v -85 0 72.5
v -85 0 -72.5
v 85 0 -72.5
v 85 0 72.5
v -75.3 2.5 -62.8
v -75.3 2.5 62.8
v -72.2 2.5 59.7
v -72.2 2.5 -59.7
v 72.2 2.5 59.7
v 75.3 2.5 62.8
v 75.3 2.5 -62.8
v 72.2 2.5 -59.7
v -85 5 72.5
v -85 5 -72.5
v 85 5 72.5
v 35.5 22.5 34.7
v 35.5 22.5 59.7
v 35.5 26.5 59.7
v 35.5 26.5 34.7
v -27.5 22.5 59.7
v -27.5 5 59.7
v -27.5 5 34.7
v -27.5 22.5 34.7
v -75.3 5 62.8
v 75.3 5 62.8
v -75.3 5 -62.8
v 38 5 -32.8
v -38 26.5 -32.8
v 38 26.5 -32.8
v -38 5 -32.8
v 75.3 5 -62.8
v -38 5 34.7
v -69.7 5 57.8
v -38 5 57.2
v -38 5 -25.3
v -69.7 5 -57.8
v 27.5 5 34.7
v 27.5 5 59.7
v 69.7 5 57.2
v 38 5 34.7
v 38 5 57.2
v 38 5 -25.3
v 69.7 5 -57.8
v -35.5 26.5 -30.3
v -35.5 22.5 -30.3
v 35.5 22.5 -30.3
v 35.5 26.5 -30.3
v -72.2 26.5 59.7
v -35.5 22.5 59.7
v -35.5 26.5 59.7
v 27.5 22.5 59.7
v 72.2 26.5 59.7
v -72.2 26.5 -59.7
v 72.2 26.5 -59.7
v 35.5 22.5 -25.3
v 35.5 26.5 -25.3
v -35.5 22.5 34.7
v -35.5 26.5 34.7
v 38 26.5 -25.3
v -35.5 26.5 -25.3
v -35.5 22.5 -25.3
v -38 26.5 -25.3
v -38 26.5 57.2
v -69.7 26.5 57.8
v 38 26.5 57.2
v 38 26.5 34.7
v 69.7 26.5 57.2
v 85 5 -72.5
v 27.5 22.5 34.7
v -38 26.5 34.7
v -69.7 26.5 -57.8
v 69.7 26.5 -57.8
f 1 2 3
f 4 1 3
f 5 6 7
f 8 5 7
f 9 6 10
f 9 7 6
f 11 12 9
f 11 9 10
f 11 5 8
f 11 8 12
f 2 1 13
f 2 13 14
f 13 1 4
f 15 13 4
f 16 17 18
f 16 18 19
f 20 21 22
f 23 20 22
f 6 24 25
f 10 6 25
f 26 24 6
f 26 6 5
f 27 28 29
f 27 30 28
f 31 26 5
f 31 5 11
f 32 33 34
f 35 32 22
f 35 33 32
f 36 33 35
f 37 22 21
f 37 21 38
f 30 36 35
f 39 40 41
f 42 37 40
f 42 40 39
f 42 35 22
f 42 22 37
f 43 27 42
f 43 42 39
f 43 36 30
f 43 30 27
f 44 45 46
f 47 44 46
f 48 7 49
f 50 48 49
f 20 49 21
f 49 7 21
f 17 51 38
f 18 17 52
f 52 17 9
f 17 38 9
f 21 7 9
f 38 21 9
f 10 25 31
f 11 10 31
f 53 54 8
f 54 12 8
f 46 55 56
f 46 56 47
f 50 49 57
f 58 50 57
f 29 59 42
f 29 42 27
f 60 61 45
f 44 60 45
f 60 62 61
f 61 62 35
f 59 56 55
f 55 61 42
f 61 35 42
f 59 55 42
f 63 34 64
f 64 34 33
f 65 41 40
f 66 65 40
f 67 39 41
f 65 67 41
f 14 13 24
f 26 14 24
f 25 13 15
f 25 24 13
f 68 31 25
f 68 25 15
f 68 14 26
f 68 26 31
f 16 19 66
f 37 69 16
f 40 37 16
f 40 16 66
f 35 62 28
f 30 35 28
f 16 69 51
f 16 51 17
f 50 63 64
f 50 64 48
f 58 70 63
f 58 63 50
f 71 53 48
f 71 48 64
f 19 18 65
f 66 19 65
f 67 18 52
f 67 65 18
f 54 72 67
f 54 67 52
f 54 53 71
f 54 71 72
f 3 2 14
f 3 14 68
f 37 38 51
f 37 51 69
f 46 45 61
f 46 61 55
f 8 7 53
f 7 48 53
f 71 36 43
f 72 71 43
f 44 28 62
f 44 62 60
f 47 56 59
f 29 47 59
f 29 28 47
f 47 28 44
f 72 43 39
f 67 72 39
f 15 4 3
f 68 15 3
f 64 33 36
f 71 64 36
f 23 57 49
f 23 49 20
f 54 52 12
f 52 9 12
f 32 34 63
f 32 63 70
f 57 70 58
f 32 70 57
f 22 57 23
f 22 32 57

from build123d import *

# Parameters (mm, degrees)
SKETCH1_W           = 170
SKETCH1_H           = 145
BOSS_EXTRUDE1_DEPTH = 5
SKETCH2_W           = 150.6
SKETCH2_H           = 125.6
SKETCH2_W_2         = 144.4
SKETCH2_H_2         = 119.4
CUT_EXTRUDE1_DEPTH  = 2.5
SKETCH5_W           = 71
SKETCH5_H           = 7.5
SKETCH5_W_2         = 8
SKETCH5_H_2         = 25
BOSS_EXTRUDE2_DEPTH = 17.5
SKETCH6_W           = 2.5
SKETCH6_H           = 7.5
SKETCH6_H_2         = 25
BOSS_EXTRUDE3_DEPTH = 21.5
SKETCH7_W           = 71
SKETCH7_H           = 2.5
BOSS_EXTRUDE4_DEPTH = 4
BOSS_EXTRUDE6_DEPTH = 21.5


with BuildPart() as part:
    # Sketch1 → Boss-Extrude1 (new body)
    with BuildSketch(Plane(origin=(0, 0, 0), x_dir=(1, 0, 0), z_dir=(0, 1, 0))):
        Rectangle(SKETCH1_W, SKETCH1_H)
    extrude(amount=BOSS_EXTRUDE1_DEPTH)

    # Sketch2 → Cut-Extrude1 (cut)
    with BuildSketch(Plane(origin=(0, 5, 0), x_dir=(1, 0, 0), z_dir=(0, 1, 0))):
        Rectangle(SKETCH2_W, SKETCH2_H)
        Rectangle(SKETCH2_W_2, SKETCH2_H_2, mode=Mode.SUBTRACT)
    extrude(amount=-CUT_EXTRUDE1_DEPTH, mode=Mode.SUBTRACT)

    # Sketch5 → Boss-Extrude2 (add)
    with BuildSketch(Plane(origin=(0, 5, 0), x_dir=(1, 0, 0), z_dir=(0, 1, 0))):
        with Locations((0, 29.05)):
            Rectangle(SKETCH5_W, SKETCH5_H)
        with Locations((-31.5, -47.2)):
            Rectangle(SKETCH5_W_2, SKETCH5_H_2)
        with Locations((31.5, -47.2)):
            Rectangle(SKETCH5_W_2, SKETCH5_H_2)
    extrude(amount=BOSS_EXTRUDE2_DEPTH)

    # Sketch6 → Boss-Extrude3 (add)
    with BuildSketch(Plane(origin=(0, 5, 0), x_dir=(1, 0, 0), z_dir=(0, 1, 0))):
        with Locations((36.75, 29.05)):
            Rectangle(SKETCH6_W, SKETCH6_H)
        with Locations((-36.75, 29.05)):
            Rectangle(SKETCH6_W, SKETCH6_H)
        with Locations((36.75, -47.2)):
            Rectangle(SKETCH6_W, SKETCH6_H_2)
        with Locations((-36.75, -47.2)):
            Rectangle(SKETCH6_W, SKETCH6_H_2)
    extrude(amount=BOSS_EXTRUDE3_DEPTH)

    # Sketch7 → Boss-Extrude4 (add)
    with BuildSketch(Plane(origin=(0, 22.5, 0), x_dir=(1, 0, 0), z_dir=(0, 1, 0))):
        with Locations((0, 31.55)):
            Rectangle(SKETCH7_W, SKETCH7_H)
    extrude(amount=BOSS_EXTRUDE4_DEPTH)

    # Sketch9 → Boss-Extrude6 (add)
    with BuildSketch(Plane(origin=(0, 5, 0), x_dir=(1, 0, 0), z_dir=(0, 1, 0))):
        Polygon((38, -59.7), (72.2, -59.7), (72.2, -57.8), (72.2, 57.8), (72.2, 59.7), (-72.2, 59.7), (-72.2, 57.8), (-72.2, -57.8), (-72.2, -59.7), (-38, -59.7), (-38, -57.2), (-69.7, -57.8), (-69.7, 57.8), (69.7, 57.8), (69.7, -57.2), (38, -57.2), align=None)
    extrude(amount=BOSS_EXTRUDE6_DEPTH)


solid = part.part
